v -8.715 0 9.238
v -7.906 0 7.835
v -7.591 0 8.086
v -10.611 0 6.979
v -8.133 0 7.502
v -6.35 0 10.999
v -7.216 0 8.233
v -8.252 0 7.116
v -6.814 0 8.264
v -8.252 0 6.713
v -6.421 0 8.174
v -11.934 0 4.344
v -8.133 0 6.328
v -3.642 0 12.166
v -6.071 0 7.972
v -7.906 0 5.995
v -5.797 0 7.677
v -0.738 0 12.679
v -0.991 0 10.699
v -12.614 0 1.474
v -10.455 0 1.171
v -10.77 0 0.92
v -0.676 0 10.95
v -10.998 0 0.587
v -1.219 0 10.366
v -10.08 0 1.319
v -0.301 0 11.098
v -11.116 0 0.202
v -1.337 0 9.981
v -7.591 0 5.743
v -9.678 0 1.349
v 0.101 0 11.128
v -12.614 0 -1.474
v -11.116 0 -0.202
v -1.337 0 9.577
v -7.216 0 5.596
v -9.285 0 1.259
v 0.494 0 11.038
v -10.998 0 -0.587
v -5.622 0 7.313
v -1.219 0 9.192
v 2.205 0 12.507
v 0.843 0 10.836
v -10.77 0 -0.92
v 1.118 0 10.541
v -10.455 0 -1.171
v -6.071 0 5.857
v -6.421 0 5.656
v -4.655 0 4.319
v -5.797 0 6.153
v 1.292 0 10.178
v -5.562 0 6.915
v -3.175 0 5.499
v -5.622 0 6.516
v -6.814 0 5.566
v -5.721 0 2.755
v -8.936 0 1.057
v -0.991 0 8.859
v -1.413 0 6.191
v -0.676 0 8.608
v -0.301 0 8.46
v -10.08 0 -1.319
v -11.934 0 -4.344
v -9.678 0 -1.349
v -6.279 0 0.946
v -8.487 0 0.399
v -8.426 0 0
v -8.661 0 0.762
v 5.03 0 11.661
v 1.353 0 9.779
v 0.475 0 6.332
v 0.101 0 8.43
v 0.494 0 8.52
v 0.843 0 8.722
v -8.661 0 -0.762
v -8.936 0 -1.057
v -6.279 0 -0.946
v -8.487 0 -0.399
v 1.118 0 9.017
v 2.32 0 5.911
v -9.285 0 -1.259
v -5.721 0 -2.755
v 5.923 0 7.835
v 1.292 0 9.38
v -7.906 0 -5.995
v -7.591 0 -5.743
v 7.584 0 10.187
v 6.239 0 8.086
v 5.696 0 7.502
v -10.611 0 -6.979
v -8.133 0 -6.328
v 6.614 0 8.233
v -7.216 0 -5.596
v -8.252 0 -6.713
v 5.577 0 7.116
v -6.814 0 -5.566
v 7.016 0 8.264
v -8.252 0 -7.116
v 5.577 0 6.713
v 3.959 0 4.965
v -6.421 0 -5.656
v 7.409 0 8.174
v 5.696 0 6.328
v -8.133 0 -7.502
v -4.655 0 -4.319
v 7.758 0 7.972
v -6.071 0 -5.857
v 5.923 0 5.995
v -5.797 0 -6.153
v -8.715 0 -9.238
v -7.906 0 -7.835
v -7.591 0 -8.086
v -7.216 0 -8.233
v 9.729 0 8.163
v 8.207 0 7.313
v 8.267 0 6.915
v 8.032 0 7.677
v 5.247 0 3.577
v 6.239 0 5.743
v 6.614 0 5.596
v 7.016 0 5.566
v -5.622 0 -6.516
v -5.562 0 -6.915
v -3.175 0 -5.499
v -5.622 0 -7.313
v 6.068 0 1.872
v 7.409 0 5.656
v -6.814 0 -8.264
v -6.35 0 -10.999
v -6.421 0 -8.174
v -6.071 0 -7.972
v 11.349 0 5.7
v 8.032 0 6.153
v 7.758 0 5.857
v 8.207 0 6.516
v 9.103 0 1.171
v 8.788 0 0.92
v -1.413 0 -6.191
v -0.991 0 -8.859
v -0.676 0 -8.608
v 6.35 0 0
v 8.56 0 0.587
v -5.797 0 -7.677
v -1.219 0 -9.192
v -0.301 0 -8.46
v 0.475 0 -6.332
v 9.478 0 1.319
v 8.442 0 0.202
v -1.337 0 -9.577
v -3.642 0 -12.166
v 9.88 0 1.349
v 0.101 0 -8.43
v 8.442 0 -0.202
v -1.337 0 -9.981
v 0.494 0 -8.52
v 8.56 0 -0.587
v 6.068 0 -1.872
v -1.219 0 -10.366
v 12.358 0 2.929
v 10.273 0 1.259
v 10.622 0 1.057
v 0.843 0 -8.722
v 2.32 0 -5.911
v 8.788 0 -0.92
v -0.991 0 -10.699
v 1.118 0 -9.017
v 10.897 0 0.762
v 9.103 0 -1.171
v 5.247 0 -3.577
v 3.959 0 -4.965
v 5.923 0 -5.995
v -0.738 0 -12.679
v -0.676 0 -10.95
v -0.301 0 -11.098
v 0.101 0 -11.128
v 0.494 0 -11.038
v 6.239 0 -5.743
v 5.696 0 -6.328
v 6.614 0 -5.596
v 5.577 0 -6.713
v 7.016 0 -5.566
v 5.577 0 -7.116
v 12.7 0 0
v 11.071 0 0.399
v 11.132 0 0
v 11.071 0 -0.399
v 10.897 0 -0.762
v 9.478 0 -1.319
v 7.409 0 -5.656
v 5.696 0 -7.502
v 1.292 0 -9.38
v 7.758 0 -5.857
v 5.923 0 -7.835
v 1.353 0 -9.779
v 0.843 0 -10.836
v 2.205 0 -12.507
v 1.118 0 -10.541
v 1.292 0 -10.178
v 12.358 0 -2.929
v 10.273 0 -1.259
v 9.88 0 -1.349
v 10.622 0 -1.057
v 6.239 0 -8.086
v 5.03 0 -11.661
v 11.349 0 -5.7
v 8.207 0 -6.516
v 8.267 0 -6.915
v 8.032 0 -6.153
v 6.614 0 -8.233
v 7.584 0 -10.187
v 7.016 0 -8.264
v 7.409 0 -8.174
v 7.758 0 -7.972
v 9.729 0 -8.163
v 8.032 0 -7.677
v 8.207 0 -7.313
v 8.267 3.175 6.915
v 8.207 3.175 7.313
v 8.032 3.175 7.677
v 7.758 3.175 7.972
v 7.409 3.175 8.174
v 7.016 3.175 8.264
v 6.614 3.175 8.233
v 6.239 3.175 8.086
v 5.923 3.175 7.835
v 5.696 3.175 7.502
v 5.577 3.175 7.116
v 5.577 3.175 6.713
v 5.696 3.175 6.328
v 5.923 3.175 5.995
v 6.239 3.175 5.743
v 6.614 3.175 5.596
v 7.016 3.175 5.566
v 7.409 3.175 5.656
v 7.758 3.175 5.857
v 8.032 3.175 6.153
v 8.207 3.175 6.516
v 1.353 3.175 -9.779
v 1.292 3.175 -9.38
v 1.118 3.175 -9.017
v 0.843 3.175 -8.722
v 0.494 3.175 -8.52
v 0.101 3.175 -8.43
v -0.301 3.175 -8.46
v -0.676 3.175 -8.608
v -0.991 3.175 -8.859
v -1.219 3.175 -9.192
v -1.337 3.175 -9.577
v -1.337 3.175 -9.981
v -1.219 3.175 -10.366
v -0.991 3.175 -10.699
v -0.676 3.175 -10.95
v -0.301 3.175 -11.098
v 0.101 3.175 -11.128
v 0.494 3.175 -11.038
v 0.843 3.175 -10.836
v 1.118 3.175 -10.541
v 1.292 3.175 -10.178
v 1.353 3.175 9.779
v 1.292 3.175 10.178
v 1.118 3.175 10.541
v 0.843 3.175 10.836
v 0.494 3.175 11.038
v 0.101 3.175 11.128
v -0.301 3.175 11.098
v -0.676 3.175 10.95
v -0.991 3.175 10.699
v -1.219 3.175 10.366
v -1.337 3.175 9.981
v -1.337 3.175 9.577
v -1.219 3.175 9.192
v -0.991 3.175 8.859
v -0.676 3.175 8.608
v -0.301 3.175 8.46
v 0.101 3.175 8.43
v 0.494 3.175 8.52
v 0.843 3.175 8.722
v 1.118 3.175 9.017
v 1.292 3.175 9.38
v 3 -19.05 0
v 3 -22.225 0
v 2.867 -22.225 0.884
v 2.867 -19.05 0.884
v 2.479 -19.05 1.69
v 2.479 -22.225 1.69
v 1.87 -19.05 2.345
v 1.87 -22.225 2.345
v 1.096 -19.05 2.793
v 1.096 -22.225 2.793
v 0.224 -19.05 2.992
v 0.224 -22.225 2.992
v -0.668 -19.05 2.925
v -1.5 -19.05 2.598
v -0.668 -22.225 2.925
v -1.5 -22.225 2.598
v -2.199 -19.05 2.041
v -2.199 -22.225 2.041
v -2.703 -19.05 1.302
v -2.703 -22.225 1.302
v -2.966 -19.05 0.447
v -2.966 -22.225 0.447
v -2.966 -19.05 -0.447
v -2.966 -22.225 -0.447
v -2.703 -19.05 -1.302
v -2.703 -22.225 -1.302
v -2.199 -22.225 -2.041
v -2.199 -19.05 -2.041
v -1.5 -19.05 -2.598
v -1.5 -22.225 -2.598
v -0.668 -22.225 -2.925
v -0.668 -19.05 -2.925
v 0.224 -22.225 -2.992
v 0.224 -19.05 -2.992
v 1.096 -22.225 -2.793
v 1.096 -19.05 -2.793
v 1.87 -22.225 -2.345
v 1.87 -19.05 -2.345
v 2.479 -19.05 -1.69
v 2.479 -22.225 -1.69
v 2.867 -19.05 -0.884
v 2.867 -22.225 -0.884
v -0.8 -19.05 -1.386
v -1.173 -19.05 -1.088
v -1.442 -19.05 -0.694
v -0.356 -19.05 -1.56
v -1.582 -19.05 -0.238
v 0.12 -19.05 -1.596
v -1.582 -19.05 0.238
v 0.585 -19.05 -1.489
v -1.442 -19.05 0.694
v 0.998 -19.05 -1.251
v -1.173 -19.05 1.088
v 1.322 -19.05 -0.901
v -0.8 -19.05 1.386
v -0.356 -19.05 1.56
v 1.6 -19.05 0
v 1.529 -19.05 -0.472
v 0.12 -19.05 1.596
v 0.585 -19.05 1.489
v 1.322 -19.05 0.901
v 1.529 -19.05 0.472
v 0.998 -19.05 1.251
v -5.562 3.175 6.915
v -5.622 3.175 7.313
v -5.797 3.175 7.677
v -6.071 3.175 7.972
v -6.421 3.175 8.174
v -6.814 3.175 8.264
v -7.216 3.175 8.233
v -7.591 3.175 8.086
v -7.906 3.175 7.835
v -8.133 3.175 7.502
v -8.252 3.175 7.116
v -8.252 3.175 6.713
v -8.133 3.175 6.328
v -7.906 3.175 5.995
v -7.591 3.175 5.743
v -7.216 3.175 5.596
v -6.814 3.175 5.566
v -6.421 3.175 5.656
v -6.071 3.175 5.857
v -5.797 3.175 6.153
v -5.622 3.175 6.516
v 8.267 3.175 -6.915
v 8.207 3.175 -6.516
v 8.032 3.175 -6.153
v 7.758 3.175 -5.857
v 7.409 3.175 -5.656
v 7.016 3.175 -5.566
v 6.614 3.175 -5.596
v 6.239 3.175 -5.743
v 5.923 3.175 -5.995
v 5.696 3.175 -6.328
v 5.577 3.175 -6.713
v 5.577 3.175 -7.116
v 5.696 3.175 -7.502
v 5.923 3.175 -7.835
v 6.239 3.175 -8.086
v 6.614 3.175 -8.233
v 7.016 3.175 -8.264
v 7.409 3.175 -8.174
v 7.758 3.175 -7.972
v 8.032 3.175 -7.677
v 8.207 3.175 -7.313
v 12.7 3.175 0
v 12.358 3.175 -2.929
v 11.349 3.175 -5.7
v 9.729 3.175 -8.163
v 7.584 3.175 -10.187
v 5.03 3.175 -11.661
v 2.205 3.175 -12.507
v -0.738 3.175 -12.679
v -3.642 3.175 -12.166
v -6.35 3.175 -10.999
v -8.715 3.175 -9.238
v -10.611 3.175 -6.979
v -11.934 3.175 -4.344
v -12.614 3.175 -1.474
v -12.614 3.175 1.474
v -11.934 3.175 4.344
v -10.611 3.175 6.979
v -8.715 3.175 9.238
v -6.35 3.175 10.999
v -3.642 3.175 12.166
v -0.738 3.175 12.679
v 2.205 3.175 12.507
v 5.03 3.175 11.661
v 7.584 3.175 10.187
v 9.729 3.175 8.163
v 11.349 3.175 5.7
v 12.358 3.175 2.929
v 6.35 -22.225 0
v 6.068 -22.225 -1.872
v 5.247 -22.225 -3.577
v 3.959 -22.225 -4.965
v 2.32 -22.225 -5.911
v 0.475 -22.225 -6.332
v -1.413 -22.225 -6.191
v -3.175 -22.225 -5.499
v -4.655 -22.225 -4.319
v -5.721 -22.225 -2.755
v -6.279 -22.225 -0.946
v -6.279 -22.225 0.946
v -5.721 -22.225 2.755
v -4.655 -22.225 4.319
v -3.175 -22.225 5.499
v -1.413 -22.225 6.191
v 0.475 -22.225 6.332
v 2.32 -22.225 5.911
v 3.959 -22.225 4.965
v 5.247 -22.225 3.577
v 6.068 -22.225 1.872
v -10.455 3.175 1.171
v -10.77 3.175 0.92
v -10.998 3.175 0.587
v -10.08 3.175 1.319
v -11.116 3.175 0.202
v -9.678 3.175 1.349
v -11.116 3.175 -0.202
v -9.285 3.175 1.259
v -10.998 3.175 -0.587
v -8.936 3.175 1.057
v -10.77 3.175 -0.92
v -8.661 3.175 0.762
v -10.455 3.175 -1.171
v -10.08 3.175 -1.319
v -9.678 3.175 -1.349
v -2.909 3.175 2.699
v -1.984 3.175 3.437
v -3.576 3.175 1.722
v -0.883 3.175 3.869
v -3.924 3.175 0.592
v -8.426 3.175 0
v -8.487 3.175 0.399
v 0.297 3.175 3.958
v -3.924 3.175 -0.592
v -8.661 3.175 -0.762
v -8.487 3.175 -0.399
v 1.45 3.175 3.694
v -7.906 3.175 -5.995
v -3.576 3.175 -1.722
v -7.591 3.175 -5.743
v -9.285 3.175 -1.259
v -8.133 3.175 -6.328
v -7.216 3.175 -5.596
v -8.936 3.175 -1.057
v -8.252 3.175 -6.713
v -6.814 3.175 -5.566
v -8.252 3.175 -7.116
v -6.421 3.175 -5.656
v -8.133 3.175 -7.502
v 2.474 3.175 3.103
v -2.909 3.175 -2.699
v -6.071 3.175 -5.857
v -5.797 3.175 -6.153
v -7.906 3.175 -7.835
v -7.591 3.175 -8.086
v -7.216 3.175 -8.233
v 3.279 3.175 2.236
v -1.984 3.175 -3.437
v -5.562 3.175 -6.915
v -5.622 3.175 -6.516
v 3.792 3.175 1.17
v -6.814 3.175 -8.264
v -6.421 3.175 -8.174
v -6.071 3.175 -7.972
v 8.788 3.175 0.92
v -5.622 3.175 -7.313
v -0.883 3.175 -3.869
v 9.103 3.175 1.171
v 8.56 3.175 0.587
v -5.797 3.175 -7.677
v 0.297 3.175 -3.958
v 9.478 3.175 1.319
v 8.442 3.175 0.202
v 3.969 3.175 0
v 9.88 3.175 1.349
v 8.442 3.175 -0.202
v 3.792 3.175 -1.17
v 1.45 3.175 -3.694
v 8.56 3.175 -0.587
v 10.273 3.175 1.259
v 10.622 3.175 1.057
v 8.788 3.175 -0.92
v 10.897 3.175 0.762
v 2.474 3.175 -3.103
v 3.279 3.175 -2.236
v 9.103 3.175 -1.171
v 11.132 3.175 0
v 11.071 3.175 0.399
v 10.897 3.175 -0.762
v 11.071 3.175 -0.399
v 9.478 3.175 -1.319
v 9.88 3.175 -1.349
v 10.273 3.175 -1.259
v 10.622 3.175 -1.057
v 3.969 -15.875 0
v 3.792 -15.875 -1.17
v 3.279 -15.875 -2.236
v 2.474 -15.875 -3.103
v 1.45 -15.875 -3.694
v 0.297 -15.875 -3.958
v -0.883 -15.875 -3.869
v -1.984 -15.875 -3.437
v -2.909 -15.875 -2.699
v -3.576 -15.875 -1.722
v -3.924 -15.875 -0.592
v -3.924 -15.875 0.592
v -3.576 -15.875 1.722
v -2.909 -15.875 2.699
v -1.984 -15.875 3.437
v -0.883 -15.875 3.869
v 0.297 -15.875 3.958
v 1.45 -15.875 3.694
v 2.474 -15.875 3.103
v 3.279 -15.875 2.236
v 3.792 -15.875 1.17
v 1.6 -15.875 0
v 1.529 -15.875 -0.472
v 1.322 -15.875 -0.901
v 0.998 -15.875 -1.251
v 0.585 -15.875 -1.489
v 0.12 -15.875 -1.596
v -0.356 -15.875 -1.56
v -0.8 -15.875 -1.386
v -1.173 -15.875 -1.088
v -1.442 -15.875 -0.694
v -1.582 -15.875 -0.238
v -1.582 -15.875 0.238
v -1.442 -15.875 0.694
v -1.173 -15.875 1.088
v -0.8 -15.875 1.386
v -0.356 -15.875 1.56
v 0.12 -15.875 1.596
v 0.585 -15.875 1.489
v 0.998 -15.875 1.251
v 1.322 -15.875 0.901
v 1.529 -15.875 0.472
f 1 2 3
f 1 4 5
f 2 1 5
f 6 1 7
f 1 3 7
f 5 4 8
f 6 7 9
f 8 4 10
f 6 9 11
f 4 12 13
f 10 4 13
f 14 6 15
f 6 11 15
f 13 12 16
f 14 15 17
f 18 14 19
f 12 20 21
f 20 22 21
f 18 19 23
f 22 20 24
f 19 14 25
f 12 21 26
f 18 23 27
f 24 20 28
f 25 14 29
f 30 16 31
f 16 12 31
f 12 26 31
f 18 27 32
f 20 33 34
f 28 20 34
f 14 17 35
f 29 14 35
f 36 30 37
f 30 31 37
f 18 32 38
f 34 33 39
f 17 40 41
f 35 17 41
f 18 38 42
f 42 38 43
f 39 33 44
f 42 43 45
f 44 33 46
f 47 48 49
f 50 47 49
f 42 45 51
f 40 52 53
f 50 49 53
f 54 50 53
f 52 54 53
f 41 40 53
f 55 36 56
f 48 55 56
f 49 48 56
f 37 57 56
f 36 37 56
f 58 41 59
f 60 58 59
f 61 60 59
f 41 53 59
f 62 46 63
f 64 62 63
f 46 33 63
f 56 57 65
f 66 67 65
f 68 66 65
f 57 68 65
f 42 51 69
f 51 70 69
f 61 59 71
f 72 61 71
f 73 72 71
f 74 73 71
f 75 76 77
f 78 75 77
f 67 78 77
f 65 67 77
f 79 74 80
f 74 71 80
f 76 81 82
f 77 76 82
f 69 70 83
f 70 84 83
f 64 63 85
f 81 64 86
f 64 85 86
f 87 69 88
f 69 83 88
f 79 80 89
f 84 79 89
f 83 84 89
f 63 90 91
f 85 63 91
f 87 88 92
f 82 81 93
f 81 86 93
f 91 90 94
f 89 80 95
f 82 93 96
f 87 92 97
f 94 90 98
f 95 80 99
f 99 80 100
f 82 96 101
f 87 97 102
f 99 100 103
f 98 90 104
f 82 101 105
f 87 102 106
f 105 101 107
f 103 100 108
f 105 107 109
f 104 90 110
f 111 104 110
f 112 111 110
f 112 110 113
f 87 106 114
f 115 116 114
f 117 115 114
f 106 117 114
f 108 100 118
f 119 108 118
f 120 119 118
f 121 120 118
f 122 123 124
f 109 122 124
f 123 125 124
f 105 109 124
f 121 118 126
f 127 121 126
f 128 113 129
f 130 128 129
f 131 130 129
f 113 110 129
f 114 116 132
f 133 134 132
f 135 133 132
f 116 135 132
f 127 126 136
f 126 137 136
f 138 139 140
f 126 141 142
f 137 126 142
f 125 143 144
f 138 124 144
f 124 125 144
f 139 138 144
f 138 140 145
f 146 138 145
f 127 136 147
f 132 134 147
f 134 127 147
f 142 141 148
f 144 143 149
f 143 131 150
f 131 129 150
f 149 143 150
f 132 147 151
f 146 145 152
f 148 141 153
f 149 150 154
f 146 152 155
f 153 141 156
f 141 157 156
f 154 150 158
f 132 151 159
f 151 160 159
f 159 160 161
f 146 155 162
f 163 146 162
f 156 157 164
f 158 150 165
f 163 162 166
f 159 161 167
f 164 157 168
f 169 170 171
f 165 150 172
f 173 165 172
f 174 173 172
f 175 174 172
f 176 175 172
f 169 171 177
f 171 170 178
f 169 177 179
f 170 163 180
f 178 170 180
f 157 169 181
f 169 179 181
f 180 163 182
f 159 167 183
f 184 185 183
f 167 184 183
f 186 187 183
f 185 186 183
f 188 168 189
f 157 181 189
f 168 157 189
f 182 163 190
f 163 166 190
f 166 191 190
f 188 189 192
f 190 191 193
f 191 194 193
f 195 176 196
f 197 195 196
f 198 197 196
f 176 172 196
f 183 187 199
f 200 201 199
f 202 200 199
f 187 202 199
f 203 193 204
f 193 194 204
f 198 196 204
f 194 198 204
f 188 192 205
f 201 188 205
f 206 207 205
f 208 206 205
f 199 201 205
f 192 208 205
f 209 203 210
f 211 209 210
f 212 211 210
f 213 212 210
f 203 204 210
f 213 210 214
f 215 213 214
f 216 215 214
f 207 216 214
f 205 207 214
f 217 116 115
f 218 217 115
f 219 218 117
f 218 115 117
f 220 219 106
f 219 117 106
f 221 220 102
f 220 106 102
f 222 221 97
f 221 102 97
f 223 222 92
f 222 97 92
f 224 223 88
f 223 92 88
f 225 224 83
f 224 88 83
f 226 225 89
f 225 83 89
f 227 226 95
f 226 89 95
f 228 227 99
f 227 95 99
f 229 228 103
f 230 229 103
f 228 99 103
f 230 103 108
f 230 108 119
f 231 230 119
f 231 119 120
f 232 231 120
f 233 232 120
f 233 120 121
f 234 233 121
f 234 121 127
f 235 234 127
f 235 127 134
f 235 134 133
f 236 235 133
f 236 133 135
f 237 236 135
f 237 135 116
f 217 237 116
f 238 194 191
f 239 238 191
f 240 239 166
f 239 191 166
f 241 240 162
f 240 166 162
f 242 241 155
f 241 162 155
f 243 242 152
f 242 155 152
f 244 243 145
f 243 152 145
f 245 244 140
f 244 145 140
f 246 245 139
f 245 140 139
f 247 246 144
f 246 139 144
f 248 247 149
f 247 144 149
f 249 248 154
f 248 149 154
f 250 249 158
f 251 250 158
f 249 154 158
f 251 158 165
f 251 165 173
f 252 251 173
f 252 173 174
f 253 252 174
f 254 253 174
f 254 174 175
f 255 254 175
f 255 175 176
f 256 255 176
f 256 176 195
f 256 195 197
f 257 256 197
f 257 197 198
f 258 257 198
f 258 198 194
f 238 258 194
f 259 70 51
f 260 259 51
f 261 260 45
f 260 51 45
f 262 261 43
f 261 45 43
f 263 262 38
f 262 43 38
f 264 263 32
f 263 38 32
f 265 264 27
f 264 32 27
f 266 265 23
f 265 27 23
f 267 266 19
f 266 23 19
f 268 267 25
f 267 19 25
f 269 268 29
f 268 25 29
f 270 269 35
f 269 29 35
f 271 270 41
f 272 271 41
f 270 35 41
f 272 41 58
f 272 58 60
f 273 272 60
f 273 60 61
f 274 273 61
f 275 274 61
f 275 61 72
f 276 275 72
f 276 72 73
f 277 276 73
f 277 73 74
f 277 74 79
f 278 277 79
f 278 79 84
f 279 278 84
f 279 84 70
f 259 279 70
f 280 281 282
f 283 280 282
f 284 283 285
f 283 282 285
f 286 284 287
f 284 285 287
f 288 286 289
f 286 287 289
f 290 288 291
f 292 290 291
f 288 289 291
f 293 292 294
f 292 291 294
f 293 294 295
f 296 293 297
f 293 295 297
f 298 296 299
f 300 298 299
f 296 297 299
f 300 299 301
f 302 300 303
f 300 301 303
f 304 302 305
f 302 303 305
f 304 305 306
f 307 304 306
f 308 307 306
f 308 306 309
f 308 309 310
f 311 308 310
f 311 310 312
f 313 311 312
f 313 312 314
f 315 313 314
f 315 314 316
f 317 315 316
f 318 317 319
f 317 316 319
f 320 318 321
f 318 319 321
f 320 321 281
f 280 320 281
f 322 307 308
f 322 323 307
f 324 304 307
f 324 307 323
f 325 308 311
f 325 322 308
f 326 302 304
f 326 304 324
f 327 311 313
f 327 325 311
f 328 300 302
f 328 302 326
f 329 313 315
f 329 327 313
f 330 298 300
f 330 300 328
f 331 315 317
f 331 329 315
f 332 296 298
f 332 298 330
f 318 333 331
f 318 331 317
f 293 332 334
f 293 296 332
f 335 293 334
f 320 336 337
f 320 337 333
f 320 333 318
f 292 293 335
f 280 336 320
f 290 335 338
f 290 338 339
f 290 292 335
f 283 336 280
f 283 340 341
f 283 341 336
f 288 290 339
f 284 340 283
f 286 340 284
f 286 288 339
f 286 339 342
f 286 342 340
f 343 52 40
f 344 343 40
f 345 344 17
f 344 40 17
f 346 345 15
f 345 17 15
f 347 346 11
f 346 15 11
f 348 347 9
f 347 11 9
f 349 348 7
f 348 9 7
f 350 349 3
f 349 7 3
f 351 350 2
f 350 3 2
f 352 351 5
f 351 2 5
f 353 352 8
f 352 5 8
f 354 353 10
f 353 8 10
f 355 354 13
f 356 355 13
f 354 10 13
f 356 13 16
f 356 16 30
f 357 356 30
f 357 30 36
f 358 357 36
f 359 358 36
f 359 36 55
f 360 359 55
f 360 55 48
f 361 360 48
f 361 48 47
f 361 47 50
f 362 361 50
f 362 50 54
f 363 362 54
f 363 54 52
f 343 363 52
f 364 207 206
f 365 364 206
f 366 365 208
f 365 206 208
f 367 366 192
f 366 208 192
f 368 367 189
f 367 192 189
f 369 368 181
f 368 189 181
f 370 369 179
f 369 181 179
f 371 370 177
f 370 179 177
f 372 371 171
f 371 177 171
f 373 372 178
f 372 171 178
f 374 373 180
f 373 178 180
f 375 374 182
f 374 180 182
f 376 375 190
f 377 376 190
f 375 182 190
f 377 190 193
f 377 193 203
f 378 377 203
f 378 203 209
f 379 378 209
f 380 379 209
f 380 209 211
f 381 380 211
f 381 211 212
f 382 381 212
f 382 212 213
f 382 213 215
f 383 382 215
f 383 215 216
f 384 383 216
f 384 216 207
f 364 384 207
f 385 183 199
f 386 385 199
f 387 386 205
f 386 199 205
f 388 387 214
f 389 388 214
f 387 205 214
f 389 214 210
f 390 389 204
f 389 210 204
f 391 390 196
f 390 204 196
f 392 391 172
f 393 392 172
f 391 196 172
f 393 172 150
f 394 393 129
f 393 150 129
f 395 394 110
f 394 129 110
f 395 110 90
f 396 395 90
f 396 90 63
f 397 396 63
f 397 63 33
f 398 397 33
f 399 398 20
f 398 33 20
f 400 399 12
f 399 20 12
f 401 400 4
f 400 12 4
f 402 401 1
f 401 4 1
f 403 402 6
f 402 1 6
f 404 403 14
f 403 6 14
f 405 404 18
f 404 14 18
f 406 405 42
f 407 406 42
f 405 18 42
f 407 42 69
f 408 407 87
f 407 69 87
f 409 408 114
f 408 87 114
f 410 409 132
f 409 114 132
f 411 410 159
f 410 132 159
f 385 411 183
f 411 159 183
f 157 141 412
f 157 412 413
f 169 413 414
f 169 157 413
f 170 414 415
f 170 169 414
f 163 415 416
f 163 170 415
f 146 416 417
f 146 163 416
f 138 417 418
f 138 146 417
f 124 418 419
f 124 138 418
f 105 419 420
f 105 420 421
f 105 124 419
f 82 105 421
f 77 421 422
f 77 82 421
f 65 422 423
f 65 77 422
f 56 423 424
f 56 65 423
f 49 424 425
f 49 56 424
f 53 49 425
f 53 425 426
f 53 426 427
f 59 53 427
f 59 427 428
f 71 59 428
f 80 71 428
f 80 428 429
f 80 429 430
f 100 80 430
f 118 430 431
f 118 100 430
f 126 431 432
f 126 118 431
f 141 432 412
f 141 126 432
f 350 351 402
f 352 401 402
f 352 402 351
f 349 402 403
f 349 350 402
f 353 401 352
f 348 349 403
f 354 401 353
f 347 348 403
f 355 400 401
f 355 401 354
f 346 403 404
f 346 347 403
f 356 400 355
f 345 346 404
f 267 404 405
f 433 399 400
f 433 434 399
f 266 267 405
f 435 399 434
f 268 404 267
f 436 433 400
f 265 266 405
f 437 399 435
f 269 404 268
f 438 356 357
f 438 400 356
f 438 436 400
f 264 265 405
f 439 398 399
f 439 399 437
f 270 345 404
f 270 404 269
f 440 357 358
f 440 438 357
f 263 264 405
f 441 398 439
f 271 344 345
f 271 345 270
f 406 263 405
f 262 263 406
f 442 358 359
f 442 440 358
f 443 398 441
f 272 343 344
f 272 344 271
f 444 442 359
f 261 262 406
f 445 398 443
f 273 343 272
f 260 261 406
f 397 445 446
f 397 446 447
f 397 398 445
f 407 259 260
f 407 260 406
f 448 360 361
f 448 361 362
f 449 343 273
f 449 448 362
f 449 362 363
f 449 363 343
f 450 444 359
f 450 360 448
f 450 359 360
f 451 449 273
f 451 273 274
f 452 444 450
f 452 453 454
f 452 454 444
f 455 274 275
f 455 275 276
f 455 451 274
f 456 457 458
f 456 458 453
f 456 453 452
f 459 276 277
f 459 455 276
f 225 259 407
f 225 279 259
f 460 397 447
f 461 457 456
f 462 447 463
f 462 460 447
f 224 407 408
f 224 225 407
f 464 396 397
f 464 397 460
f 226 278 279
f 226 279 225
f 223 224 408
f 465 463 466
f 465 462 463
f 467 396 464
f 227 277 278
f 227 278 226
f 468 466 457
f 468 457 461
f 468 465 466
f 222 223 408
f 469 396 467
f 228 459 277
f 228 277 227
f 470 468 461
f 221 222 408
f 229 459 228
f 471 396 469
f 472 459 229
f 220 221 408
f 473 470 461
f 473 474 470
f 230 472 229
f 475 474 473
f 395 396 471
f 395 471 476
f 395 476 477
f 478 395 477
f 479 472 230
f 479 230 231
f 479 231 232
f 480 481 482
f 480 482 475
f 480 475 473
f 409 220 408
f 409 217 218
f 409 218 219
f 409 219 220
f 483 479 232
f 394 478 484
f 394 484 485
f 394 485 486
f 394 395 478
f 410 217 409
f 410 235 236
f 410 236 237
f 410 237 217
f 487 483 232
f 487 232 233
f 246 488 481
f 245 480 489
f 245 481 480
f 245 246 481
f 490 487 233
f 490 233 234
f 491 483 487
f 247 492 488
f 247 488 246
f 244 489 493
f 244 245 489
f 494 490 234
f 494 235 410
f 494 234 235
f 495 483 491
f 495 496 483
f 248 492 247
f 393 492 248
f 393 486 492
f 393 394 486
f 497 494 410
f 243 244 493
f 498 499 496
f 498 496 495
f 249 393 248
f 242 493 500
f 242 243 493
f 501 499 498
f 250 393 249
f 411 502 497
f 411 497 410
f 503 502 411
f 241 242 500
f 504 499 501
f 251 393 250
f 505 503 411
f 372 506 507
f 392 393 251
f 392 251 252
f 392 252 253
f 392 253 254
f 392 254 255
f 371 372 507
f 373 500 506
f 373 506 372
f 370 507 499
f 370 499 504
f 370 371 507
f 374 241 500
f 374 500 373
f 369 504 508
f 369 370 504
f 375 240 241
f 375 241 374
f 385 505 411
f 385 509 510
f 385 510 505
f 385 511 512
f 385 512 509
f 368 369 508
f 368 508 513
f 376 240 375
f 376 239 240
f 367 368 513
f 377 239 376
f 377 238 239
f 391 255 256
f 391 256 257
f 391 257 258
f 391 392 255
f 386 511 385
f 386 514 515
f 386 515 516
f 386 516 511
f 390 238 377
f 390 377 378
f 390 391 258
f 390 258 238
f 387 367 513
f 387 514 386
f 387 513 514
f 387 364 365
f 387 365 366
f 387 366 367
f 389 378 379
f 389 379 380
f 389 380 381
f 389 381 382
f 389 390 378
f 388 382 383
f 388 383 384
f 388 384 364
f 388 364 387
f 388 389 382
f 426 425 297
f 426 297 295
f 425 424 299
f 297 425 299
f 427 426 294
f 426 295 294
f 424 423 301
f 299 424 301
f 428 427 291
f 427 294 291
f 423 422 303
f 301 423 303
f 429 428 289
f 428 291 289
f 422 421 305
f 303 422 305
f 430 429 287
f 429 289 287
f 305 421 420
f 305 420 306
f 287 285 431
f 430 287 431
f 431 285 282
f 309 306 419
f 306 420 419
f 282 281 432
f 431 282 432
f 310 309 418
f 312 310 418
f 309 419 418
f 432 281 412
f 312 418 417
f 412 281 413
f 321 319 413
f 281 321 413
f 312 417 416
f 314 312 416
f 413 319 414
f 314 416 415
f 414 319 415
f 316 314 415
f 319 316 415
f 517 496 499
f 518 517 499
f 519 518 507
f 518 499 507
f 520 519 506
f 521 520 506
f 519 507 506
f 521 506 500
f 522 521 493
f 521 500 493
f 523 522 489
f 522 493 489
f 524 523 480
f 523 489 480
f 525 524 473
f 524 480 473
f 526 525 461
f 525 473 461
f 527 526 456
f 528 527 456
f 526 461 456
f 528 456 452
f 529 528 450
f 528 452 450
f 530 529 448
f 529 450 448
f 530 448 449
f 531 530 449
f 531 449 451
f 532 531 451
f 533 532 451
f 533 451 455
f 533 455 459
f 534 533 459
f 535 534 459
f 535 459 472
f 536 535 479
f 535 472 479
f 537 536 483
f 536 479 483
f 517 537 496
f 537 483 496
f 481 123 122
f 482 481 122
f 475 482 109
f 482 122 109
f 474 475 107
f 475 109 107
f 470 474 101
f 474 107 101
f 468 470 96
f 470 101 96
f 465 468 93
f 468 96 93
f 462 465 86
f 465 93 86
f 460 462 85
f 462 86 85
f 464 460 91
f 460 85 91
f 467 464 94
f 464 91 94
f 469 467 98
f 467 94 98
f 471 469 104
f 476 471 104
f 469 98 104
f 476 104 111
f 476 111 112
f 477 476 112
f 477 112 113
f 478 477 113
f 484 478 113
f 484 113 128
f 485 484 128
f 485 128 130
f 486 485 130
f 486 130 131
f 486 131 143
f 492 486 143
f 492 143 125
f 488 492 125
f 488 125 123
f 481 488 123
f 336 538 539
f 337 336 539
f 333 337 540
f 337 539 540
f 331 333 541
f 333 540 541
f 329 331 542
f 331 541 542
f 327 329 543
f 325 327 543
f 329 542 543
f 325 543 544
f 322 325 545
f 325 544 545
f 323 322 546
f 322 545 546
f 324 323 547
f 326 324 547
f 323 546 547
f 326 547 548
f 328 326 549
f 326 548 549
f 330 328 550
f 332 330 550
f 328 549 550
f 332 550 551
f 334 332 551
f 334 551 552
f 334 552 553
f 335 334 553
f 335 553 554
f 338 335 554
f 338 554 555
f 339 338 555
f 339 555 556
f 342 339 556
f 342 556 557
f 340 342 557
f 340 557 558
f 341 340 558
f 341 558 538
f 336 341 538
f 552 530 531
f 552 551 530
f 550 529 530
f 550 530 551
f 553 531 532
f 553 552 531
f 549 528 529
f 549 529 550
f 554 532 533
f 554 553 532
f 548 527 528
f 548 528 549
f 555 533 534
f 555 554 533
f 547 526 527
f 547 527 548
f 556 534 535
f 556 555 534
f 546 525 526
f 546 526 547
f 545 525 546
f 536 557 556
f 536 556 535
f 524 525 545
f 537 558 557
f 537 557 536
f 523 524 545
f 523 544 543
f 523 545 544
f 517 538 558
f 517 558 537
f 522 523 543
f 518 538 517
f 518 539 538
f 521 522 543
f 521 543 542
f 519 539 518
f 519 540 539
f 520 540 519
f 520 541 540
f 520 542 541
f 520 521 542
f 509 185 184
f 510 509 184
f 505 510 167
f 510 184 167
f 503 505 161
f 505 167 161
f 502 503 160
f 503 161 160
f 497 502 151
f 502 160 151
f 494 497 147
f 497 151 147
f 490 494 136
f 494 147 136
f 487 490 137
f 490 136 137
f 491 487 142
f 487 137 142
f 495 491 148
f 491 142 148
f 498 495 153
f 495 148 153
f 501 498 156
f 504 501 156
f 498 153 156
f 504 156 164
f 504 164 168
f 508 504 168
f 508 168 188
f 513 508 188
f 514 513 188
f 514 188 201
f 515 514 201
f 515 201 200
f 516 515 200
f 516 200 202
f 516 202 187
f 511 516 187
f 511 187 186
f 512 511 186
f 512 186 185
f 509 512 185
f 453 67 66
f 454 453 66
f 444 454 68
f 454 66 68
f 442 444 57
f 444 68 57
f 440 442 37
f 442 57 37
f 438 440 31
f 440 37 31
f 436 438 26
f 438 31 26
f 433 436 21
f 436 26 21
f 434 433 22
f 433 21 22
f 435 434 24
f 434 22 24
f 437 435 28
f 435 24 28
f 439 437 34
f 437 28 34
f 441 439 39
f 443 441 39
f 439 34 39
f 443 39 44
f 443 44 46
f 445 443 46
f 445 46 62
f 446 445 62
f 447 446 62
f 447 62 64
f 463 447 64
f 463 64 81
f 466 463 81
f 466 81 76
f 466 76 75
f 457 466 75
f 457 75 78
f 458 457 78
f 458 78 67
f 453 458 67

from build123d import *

# Parameters (mm, degrees)
SKETCH1_R                 = 12.7
BOSS_EXTRUDE1_DEPTH       = 3.175
SKETCH2_R                 = 6.35
BOSS_EXTRUDE2_DEPTH       = 22.225
SKETCH3_R                 = 3
CUT_EXTRUDE1_DEPTH        = 3.175
SKETCH4_R                 = 3.96875
CUT_EXTRUDE2_DEPTH        = 19.05
CUT_EXTRUDE3_REACH        = 8.35
SKETCH5_R                 = 1.6
F_6_32_TAPPED_HOLE1_D     = 2.7051
F_6_32_TAPPED_HOLE1_DEPTH = 3.175


with BuildPart() as part:
    # Sketch1 → Boss-Extrude1 (new body)
    with BuildSketch(Plane(origin=(0, 0, 0), x_dir=(1, 0, 0), z_dir=(0, 1, 0))):
        Circle(SKETCH1_R)
    extrude(amount=BOSS_EXTRUDE1_DEPTH)

    # Sketch2 → Boss-Extrude2 (add)
    with BuildSketch(Plane(origin=(0, 0, 0), x_dir=(1, 0, 0), z_dir=(0, 1, 0))):
        Circle(SKETCH2_R)
    extrude(amount=-BOSS_EXTRUDE2_DEPTH)

    # Sketch3 → Cut-Extrude1 (cut)
    with BuildSketch(Plane.XZ.offset(22.225)):
        Circle(SKETCH3_R)
    extrude(amount=-CUT_EXTRUDE1_DEPTH, mode=Mode.SUBTRACT)

    # Sketch4 → Cut-Extrude2 (cut)
    with BuildSketch(Plane(origin=(0, 3.175, 0), x_dir=(1, 0, 0), z_dir=(0, 1, 0))):
        Circle(SKETCH4_R)
    extrude(amount=-CUT_EXTRUDE2_DEPTH, mode=Mode.SUBTRACT)

    # Sketch5 → Cut-Extrude3 (cut, up to next)
    with BuildSketch(Plane(origin=(0, -15.875, 0), x_dir=(1, 0, 0), z_dir=(0, 1, 0)), mode=Mode.PRIVATE) as cut_extrude3_sk1:
        Circle(SKETCH5_R)
    cut_extrude3_tool1 = extrude(cut_extrude3_sk1.sketch, amount=-CUT_EXTRUDE3_REACH, mode=Mode.PRIVATE) & part.part
    add(cut_extrude3_tool1.solids().sort_by_distance((0, -15.875, 0))[0], mode=Mode.SUBTRACT)

    # #6-32 Tapped Hole1
    with Locations(Plane(origin=(0, 3.175, 0), x_dir=(-1, 0, 0), z_dir=(0, 1, 0))):
        with Locations((0, -9.779), (-6.914797213, -6.914797213), (-9.779, 0), (-6.914797213, 6.914797213), (0, 9.779), (6.914797213, 6.914797213), (9.779, 0), (6.914797213, -6.914797213)):
            Hole(F_6_32_TAPPED_HOLE1_D / 2, depth=F_6_32_TAPPED_HOLE1_DEPTH)


solid = part.part
